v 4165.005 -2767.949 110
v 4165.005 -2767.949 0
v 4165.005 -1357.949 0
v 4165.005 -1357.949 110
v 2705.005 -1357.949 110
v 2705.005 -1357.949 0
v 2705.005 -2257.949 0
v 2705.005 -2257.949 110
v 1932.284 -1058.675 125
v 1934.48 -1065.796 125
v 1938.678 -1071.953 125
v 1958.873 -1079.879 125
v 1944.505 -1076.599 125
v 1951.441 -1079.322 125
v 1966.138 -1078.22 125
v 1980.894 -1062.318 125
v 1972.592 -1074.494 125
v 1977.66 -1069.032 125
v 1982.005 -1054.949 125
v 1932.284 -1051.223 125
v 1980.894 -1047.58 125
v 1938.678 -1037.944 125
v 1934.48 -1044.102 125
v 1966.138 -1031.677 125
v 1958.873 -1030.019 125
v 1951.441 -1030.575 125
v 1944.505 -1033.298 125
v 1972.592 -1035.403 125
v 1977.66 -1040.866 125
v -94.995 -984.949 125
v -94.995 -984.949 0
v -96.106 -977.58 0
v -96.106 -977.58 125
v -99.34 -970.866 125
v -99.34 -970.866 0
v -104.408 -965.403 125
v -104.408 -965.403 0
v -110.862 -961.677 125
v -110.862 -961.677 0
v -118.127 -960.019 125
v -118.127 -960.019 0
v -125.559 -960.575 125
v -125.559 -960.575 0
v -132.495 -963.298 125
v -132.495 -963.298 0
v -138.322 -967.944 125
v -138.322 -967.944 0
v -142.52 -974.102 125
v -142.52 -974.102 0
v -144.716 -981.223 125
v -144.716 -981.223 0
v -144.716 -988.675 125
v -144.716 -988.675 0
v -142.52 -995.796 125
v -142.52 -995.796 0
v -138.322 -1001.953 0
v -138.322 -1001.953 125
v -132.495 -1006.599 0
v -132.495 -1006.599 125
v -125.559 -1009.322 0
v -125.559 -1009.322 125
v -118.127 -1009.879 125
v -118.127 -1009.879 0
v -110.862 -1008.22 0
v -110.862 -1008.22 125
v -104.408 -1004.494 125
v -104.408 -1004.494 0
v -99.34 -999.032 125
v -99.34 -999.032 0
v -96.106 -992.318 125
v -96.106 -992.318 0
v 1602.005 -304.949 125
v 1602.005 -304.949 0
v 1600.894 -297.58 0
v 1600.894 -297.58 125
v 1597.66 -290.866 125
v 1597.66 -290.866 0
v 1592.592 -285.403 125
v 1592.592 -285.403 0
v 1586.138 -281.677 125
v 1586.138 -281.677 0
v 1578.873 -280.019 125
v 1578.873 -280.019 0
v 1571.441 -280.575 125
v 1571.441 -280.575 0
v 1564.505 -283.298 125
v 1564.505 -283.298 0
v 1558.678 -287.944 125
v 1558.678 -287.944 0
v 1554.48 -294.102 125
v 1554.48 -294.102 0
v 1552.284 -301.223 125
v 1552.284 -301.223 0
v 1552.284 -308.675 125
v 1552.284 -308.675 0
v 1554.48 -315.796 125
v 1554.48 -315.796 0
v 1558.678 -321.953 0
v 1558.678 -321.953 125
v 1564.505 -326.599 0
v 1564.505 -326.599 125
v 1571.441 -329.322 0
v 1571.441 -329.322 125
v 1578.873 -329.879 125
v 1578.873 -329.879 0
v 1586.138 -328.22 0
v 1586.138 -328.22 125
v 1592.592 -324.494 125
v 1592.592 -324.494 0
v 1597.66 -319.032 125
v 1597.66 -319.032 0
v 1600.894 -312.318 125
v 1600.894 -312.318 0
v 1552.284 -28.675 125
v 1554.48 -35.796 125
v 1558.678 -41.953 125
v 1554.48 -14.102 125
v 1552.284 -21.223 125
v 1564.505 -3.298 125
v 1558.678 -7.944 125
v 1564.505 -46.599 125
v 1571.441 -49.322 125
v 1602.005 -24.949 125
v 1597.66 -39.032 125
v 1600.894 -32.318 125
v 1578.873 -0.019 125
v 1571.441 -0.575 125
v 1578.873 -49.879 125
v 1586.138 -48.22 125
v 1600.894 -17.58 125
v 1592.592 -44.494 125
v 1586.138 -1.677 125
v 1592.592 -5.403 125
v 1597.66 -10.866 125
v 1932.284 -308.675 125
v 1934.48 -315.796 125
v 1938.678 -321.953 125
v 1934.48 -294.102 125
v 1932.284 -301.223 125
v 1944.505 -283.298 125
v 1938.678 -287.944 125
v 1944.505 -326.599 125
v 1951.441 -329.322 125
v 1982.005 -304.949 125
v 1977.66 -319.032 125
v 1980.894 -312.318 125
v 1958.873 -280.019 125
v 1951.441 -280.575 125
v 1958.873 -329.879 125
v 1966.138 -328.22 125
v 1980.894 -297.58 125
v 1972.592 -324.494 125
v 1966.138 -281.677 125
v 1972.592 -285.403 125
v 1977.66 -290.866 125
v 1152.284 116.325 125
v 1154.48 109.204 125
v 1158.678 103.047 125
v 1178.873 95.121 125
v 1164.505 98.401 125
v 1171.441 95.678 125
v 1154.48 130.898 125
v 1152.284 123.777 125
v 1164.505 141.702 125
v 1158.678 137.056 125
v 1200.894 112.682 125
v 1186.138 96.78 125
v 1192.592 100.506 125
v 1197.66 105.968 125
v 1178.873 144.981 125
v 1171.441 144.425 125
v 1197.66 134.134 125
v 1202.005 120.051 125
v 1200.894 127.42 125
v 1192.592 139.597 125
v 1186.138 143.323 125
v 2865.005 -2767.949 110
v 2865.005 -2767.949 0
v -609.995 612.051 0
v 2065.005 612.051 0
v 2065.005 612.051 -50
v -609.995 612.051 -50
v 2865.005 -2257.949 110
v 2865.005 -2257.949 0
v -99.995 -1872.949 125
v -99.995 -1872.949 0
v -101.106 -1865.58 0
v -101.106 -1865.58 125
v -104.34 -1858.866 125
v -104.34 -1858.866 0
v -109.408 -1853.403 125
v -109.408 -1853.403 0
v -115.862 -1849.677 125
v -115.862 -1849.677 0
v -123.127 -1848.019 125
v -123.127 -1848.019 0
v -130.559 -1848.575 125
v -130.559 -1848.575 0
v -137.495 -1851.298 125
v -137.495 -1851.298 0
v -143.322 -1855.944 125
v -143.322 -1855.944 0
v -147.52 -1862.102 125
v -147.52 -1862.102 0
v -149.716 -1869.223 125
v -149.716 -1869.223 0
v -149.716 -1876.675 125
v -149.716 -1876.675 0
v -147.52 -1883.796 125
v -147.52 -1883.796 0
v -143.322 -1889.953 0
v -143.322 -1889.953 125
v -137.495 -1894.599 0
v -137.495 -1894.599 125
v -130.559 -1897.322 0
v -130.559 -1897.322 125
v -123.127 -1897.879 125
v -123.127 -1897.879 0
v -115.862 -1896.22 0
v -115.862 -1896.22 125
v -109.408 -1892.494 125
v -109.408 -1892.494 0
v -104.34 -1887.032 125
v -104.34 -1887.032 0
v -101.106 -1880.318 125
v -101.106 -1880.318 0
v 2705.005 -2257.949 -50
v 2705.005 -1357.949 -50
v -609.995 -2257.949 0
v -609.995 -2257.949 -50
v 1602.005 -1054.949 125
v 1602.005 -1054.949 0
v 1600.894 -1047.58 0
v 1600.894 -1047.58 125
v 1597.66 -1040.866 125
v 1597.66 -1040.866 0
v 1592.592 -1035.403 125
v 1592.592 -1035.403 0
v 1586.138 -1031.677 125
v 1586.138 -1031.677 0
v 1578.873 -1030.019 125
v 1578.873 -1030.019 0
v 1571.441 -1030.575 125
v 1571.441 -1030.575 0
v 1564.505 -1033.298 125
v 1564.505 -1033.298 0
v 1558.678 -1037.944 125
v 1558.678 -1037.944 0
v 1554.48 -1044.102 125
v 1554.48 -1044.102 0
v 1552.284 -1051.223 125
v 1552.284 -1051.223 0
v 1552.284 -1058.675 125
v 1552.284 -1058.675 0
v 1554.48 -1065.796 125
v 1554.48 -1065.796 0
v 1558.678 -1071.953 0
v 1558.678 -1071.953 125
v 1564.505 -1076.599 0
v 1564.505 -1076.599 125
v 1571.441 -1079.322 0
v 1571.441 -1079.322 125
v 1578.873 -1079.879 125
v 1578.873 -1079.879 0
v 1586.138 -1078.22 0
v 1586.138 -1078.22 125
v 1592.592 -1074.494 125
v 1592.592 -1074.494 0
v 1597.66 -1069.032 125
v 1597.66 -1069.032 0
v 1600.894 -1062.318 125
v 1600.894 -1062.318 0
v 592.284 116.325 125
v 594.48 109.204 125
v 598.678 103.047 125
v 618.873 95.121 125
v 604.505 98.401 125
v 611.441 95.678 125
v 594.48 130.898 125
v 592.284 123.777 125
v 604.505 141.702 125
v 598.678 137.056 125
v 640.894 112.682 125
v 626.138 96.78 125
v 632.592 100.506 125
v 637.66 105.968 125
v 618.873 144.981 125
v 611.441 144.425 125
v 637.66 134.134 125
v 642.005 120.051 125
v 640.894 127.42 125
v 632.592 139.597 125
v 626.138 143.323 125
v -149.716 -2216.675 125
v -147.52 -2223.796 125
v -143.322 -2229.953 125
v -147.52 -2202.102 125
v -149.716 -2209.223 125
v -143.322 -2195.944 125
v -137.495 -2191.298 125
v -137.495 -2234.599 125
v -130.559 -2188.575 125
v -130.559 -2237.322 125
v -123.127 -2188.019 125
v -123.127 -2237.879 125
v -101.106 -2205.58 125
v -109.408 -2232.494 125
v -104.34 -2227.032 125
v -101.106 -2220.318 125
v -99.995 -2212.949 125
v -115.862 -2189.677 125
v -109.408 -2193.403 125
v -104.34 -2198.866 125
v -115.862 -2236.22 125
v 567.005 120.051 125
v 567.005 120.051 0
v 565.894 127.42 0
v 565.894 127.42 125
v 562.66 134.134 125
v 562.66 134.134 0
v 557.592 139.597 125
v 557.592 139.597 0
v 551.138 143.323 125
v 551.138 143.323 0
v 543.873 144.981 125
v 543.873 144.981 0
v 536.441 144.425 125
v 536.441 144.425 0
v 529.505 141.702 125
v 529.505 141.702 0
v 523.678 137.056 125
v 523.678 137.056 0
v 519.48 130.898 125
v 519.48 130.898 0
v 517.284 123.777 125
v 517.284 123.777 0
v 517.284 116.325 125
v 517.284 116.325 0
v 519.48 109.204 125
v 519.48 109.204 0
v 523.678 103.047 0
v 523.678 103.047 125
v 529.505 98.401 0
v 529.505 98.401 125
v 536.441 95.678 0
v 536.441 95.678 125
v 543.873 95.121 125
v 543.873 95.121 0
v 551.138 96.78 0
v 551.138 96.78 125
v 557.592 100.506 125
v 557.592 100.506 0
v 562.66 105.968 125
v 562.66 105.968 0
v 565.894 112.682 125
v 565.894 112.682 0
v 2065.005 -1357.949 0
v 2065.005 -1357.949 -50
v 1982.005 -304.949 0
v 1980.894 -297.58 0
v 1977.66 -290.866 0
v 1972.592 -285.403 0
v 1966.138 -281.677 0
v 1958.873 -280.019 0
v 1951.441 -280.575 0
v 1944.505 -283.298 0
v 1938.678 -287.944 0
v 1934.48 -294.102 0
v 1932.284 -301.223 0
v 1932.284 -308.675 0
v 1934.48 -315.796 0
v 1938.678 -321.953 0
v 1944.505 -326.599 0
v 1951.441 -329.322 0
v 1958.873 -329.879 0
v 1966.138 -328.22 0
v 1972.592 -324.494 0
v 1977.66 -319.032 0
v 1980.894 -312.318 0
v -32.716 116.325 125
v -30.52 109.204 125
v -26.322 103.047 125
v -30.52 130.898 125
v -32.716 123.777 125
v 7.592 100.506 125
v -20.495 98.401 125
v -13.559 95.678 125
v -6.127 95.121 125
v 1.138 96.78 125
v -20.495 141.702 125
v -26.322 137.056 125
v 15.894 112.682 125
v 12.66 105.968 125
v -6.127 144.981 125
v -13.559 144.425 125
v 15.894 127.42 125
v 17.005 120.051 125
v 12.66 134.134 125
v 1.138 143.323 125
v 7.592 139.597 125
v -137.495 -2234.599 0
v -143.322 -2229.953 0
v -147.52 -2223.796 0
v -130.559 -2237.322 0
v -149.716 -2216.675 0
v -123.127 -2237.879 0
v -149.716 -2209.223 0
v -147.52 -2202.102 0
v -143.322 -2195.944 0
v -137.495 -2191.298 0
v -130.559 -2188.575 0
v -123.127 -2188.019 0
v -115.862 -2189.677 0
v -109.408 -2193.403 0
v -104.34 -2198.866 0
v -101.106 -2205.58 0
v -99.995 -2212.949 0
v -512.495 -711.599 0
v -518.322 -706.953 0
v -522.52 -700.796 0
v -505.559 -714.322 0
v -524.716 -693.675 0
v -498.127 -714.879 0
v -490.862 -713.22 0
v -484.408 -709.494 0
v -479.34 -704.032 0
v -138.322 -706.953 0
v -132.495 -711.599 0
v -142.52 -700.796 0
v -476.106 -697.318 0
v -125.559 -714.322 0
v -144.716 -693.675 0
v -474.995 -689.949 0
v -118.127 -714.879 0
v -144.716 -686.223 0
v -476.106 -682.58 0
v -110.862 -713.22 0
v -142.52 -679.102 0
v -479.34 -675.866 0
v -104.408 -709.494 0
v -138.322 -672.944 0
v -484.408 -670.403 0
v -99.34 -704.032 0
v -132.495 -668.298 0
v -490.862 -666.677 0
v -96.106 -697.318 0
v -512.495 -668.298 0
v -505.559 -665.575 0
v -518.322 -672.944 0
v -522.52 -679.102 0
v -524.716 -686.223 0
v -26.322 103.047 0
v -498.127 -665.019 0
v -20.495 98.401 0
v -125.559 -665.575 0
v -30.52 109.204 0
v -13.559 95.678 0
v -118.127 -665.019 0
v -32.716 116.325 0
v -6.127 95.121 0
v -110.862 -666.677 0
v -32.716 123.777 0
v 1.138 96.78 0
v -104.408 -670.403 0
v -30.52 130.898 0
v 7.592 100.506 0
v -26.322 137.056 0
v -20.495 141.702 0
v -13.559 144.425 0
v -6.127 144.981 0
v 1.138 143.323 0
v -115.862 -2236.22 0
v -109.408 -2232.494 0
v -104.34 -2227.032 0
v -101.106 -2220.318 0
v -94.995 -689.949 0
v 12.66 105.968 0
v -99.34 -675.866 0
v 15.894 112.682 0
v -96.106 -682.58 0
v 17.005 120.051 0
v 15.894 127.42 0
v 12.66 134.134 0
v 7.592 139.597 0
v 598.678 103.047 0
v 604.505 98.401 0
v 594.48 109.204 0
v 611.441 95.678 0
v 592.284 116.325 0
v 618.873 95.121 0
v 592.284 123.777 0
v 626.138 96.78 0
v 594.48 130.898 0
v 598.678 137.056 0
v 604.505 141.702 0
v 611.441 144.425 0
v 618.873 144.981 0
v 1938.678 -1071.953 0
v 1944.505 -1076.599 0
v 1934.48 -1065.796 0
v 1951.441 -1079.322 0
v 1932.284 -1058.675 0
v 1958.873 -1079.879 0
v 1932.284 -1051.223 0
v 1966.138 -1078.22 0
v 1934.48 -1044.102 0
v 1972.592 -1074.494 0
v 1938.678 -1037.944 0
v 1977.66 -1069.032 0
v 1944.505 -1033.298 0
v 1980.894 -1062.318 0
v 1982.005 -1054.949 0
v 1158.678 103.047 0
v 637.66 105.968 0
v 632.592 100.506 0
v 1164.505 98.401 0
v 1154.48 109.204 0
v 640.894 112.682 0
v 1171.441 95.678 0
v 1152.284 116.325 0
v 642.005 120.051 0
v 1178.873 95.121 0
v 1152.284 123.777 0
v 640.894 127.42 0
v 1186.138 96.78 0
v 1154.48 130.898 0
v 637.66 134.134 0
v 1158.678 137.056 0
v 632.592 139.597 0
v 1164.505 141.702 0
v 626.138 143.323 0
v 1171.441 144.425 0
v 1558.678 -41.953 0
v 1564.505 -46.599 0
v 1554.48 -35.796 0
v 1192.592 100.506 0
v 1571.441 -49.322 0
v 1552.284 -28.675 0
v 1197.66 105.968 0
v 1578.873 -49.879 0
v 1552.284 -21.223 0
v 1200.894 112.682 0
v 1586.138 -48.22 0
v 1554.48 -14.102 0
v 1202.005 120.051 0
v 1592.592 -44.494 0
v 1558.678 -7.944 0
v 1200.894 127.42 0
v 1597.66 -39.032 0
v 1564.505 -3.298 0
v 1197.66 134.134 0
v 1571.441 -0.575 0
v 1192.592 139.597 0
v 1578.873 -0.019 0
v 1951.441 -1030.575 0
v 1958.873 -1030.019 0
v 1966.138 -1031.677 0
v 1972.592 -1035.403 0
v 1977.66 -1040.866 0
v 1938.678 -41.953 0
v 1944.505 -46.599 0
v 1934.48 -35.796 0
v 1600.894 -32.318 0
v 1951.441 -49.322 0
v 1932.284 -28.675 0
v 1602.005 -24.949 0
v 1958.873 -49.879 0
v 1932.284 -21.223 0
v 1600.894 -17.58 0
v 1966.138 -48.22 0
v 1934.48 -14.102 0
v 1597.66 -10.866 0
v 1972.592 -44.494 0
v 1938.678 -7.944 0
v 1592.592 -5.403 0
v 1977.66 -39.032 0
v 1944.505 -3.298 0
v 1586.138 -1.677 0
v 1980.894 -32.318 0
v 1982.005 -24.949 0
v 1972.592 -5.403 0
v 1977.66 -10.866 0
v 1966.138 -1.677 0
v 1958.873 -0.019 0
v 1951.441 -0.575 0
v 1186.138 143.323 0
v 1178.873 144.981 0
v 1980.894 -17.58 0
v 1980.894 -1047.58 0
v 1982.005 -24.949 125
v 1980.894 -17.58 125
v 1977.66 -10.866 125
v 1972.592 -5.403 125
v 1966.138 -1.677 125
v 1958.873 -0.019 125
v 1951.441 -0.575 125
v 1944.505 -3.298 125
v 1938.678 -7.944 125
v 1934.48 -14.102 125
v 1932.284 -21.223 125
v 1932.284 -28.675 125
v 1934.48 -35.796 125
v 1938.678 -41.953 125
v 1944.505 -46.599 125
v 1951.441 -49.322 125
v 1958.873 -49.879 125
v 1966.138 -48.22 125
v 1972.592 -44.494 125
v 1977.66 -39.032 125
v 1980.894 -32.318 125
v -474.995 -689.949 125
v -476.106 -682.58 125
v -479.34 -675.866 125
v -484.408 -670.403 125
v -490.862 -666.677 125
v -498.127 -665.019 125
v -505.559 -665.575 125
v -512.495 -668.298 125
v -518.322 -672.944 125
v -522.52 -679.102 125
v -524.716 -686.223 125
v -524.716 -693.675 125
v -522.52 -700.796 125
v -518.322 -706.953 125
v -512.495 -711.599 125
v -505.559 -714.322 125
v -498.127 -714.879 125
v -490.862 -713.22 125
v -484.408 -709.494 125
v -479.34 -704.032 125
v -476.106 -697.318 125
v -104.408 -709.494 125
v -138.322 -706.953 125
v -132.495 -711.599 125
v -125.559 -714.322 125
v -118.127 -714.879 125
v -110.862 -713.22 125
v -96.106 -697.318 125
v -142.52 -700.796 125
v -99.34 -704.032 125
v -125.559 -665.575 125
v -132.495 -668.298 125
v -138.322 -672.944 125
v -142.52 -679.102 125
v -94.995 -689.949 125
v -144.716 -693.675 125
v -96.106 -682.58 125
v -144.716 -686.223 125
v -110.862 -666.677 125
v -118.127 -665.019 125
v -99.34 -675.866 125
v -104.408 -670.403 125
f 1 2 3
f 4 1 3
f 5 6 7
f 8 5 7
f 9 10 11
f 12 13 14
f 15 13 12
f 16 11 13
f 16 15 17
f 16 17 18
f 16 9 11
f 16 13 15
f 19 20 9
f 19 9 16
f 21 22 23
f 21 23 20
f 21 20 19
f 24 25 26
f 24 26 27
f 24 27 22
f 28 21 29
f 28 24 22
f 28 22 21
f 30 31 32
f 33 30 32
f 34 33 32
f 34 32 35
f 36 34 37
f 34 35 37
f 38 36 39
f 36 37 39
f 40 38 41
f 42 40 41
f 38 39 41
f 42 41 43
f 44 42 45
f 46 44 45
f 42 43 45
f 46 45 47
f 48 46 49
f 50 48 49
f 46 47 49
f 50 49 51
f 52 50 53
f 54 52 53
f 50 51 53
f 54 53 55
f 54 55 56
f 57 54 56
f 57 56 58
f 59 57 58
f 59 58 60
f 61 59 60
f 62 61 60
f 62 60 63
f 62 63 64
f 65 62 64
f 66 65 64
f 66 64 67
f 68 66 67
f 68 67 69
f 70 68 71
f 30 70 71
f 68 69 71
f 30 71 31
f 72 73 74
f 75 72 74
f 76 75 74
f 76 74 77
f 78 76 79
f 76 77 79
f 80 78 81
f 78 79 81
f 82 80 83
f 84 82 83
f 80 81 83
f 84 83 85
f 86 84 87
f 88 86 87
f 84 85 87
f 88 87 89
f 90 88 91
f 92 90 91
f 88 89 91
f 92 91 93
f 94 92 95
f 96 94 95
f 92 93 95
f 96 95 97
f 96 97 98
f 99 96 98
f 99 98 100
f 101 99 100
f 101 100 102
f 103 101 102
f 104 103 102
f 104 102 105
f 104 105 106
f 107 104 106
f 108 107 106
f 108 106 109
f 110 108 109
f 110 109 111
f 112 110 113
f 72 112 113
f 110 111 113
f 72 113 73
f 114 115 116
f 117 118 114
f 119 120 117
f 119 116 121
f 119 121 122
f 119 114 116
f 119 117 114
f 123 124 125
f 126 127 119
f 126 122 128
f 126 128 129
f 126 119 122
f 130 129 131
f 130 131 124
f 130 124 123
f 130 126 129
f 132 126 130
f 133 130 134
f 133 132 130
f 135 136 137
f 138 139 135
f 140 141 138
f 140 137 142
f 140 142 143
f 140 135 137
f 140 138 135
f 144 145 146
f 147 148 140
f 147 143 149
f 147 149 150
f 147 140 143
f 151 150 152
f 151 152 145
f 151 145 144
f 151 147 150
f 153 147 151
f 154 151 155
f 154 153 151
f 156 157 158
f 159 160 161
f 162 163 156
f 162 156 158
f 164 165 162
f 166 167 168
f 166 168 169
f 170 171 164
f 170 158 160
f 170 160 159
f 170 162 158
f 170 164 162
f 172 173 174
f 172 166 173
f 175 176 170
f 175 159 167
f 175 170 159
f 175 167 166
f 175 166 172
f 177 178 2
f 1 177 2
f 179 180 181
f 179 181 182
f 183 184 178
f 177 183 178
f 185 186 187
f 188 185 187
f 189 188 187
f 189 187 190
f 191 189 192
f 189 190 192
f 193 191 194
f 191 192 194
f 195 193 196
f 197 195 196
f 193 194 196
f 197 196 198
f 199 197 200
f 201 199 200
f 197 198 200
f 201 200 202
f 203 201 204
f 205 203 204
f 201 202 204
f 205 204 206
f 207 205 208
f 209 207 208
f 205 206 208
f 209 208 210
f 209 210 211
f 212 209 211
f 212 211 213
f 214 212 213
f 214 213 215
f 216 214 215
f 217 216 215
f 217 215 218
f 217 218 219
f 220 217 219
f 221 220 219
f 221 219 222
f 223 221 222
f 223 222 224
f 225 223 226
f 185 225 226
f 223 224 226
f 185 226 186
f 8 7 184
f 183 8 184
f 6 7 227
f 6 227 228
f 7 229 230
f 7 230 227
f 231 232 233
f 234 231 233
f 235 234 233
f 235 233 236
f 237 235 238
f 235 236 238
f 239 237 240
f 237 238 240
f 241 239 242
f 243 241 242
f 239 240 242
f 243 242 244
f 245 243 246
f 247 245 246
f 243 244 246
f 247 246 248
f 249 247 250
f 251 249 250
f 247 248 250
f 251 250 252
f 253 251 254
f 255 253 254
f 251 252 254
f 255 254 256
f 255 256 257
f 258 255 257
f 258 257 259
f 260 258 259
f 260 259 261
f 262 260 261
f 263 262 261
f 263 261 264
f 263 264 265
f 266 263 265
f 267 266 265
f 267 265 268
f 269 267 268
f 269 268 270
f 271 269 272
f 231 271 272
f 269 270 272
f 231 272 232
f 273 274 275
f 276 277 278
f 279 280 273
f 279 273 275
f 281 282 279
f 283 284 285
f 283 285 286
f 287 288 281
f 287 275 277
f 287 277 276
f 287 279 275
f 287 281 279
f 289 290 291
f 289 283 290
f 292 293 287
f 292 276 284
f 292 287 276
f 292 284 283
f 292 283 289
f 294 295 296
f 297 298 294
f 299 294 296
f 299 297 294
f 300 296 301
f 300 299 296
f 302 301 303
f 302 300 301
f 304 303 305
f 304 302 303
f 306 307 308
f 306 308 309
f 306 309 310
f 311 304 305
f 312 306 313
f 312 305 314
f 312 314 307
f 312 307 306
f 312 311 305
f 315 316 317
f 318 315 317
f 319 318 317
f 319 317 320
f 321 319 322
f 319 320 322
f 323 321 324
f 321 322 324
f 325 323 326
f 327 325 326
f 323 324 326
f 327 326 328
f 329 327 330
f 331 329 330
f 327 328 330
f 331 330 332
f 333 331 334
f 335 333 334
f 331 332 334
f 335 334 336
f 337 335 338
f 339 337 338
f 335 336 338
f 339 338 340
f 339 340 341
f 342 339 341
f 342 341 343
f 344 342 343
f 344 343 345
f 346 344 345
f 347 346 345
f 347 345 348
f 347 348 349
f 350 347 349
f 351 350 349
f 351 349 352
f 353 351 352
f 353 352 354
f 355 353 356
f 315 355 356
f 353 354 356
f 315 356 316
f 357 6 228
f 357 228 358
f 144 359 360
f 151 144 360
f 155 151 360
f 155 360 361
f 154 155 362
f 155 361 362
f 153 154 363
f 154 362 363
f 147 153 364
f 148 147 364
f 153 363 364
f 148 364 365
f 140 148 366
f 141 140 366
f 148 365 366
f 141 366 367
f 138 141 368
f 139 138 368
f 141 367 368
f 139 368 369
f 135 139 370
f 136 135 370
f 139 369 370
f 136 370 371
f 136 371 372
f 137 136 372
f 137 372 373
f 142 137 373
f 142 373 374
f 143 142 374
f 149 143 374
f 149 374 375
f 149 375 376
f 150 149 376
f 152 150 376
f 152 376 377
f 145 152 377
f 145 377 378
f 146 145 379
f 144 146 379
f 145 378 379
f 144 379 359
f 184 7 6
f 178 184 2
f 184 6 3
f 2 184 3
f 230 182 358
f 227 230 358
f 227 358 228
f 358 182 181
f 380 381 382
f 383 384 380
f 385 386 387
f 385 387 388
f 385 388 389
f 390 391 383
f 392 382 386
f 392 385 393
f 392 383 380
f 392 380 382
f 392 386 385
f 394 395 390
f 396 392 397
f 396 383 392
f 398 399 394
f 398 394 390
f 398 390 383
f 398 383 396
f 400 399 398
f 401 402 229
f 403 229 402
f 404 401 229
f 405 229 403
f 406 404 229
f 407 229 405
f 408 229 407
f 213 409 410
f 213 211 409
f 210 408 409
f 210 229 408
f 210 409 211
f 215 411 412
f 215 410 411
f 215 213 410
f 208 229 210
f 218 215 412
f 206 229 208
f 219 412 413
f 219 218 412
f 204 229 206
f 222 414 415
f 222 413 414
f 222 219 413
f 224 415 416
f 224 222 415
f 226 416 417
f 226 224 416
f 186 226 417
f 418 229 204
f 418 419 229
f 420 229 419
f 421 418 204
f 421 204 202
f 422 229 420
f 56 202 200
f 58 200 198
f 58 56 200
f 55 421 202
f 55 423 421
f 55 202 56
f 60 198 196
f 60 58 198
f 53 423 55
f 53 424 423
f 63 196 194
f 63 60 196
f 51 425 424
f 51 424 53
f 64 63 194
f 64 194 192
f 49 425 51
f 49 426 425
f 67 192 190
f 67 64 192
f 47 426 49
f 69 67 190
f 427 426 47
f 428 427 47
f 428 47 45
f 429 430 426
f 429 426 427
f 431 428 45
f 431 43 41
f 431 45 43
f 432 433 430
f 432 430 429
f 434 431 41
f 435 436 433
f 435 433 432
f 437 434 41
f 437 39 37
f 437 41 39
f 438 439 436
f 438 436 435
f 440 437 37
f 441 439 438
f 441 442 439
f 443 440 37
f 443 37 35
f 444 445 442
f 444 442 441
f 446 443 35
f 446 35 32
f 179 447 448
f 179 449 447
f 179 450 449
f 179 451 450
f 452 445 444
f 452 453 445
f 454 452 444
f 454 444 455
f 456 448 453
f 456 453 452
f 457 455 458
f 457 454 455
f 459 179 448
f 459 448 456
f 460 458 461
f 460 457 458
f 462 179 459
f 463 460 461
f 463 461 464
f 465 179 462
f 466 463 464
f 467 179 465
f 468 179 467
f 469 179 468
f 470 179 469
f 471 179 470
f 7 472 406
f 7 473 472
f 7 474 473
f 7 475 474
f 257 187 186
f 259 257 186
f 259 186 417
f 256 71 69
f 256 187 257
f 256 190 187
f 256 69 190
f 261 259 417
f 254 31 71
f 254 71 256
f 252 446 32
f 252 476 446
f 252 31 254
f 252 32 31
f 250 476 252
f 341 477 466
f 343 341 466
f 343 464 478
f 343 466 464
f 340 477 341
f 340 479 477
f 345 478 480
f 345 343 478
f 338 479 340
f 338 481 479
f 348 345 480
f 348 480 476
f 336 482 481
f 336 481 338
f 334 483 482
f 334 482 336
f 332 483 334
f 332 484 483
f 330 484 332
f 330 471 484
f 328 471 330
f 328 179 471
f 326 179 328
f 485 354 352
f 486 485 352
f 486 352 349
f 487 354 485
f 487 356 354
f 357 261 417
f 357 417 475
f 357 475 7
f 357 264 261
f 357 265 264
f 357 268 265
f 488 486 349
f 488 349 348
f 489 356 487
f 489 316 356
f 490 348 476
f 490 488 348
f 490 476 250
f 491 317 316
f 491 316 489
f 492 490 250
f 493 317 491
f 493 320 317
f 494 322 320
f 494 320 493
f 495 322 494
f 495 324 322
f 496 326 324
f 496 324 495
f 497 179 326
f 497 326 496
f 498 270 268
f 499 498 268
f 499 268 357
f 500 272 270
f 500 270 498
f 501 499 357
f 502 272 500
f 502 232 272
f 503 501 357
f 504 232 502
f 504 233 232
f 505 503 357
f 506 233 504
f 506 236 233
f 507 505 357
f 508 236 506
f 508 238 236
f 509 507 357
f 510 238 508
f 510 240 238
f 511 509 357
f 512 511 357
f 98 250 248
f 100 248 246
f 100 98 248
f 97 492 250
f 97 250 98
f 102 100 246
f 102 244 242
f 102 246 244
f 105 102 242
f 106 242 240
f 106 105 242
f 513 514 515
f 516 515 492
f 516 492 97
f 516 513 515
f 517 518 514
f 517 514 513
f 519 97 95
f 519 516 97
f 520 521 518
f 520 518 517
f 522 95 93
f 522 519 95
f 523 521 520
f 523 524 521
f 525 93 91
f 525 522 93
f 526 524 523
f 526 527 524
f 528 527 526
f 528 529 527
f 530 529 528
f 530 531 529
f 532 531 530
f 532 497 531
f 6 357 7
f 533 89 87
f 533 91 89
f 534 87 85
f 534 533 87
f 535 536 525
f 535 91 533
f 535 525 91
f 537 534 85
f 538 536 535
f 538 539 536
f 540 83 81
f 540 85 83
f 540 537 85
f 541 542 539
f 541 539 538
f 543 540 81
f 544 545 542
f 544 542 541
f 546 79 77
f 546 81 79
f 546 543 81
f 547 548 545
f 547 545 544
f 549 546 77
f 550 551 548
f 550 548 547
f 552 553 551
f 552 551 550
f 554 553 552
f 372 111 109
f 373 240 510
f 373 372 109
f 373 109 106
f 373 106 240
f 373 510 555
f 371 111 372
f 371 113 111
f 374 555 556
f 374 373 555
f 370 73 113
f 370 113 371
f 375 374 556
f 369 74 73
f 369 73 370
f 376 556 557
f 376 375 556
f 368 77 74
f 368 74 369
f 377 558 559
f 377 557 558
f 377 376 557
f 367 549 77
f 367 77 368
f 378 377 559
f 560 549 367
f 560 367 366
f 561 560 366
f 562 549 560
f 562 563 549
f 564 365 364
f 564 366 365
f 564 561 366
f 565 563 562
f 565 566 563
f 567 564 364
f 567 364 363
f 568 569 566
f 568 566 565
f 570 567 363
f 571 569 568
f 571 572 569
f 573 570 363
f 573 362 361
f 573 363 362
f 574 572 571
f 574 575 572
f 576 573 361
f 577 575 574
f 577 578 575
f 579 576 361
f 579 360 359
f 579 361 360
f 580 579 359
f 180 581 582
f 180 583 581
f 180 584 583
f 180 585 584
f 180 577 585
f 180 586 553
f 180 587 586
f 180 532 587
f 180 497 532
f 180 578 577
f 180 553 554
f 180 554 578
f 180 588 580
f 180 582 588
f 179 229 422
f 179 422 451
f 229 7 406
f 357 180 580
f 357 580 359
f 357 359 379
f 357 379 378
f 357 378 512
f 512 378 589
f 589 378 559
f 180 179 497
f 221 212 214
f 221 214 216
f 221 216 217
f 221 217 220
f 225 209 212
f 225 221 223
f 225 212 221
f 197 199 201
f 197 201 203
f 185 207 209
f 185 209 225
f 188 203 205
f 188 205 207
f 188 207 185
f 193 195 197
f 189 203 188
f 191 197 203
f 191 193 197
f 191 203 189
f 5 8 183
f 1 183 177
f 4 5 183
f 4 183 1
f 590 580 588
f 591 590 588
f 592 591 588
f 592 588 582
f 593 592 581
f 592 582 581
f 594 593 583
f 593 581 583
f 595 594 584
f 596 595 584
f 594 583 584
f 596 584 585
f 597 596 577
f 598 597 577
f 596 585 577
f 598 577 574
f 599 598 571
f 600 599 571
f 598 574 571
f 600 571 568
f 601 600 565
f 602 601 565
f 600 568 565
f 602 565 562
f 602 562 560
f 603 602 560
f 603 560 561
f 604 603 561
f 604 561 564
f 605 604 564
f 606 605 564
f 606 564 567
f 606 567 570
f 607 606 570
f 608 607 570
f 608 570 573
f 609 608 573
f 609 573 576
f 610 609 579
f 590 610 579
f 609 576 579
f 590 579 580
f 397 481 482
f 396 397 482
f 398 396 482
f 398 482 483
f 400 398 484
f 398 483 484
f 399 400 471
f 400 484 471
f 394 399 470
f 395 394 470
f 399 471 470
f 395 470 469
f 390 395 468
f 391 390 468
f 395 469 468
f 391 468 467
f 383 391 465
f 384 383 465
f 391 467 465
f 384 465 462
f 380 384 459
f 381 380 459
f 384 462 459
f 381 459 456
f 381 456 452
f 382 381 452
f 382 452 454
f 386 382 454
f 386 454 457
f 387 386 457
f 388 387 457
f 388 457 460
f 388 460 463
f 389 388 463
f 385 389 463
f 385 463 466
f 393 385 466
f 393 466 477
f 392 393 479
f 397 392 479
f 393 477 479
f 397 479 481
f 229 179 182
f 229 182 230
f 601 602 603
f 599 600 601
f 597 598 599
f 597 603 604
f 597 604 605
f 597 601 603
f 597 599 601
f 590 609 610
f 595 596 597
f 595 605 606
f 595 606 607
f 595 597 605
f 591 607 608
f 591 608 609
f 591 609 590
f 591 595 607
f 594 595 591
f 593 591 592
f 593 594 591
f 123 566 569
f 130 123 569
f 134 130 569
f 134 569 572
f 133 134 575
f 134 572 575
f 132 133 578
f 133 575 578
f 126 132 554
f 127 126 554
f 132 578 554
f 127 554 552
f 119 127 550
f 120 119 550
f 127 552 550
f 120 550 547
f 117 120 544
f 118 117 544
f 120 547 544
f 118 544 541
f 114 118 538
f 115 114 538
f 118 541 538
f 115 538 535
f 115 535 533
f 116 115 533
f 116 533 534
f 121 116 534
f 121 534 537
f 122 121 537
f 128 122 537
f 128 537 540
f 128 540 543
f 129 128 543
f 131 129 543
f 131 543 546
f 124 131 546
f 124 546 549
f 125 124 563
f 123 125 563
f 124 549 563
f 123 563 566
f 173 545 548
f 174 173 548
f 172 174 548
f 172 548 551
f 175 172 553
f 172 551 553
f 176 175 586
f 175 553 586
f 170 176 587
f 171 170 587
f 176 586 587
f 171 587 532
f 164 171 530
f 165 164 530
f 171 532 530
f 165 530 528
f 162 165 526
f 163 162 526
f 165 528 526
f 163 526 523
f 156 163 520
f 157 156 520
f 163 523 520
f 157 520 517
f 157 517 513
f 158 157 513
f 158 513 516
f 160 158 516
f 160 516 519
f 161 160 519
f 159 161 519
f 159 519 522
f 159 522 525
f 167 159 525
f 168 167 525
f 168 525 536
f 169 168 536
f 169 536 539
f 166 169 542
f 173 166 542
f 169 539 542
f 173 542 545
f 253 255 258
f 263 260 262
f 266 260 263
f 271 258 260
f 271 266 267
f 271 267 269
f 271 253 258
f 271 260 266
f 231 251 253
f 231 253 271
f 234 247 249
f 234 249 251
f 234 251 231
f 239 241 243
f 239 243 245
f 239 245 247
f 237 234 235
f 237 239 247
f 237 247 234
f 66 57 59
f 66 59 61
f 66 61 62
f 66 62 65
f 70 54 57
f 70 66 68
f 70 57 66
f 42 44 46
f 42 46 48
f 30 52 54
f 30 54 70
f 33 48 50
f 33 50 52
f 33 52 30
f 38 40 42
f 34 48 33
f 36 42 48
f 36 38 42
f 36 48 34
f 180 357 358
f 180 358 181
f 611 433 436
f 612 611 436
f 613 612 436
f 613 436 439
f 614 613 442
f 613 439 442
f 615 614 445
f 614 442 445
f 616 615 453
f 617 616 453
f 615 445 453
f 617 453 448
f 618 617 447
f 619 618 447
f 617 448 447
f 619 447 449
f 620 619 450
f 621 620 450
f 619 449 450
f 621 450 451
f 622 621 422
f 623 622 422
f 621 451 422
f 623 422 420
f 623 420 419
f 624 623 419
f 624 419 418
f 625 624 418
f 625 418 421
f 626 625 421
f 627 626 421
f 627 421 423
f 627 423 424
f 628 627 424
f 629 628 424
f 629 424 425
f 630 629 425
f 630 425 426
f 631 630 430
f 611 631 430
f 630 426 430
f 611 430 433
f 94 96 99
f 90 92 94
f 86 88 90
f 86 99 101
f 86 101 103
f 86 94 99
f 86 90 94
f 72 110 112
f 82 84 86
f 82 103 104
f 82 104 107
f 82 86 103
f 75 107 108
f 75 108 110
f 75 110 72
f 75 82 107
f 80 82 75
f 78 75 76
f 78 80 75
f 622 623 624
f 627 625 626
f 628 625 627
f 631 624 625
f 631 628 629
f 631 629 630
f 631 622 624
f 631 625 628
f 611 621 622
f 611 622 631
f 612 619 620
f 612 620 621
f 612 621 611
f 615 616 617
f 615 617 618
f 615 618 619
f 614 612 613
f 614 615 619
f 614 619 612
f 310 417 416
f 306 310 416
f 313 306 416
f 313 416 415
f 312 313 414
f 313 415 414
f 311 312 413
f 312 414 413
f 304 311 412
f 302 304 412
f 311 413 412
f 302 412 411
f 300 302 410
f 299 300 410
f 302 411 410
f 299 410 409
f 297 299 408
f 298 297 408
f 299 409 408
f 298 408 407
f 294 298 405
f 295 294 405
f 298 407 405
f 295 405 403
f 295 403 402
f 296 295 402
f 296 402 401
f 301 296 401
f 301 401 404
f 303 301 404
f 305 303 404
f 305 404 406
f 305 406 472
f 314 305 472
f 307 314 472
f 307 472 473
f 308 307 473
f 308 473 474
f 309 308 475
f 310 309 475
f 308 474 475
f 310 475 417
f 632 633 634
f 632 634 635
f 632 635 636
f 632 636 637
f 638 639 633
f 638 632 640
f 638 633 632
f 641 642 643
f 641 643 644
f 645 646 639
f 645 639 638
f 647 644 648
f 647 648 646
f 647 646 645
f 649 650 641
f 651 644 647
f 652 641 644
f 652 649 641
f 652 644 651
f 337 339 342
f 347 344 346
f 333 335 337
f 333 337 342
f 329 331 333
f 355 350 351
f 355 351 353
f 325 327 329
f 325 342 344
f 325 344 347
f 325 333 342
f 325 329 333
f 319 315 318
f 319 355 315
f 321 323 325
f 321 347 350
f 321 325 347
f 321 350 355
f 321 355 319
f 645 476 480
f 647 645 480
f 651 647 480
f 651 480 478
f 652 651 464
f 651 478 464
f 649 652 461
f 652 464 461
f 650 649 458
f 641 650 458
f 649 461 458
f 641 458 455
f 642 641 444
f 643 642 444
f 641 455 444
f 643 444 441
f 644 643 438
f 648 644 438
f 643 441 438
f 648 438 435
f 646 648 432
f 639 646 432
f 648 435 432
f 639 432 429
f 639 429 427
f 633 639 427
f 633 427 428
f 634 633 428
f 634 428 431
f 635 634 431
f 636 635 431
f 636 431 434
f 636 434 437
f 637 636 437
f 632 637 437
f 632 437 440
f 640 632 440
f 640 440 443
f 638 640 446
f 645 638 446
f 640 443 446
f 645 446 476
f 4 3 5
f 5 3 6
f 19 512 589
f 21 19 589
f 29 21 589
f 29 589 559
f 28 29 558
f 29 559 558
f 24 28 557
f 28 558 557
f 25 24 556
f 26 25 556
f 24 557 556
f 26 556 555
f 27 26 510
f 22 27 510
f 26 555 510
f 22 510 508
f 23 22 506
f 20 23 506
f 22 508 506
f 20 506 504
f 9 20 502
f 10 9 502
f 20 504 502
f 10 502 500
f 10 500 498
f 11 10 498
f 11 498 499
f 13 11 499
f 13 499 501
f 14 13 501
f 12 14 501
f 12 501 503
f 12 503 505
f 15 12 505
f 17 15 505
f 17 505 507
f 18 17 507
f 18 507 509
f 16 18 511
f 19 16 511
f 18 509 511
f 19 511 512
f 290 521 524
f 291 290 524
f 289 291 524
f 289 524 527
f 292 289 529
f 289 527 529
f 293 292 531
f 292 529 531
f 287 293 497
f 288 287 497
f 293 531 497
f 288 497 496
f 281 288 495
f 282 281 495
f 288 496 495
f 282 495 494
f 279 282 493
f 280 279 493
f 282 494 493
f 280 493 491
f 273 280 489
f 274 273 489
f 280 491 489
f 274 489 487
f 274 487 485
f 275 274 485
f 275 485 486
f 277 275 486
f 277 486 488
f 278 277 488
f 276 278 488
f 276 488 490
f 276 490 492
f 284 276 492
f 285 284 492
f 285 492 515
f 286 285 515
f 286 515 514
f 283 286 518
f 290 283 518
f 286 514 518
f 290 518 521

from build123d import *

# Parameters (mm, degrees)
F1_DEPTH = 50
F3_DEPTH = 110
F4_R     = 25
F5_DEPTH = 125


with BuildPart() as f1:
    # F0 (on Top) → F1 (new body)
    with BuildSketch(Plane.XY):
        Polygon((-609.995488, 612.05135), (-609.995488, -2257.94865), (2065.004512, -2257.94865), (2705.004512, -2257.94865), (2705.004512, -1357.94865), (2065.004512, -1357.94865), (2065.004512, 612.05135), align=None)
    extrude(amount=-F1_DEPTH)

    # F4 (on face) → F5 (join)
    with BuildSketch(Plane.XY):
        with Locations((-7.995488, 120.05135)):
            Circle(F4_R)
        with Locations((-119.995488, -689.94865)):
            Circle(F4_R)
        with Locations((-499.995488, -689.94865)):
            Circle(F4_R)
        with Locations((-119.995488, -984.94865)):
            Circle(F4_R)
        with Locations((617.004512, 120.05135)):
            Circle(F4_R)
        with Locations((542.004512, 120.05135)):
            Circle(F4_R)
        with Locations((1177.004512, 120.05135)):
            Circle(F4_R)
        with Locations((1577.004512, -24.94865)):
            Circle(F4_R)
        with Locations((1577.004512, -304.94865)):
            Circle(F4_R)
        with Locations((-124.995488, -1872.94865)):
            Circle(F4_R)
        with Locations((-124.995488, -2212.94865)):
            Circle(F4_R)
        with Locations((1957.004512, -304.94865)):
            Circle(F4_R)
        with Locations((1957.004512, -24.94865)):
            Circle(F4_R)
        with Locations((1957.004512, -1054.94865)):
            Circle(F4_R)
        with Locations((1577.004512, -1054.94865)):
            Circle(F4_R)
    extrude(amount=F5_DEPTH)


with BuildPart() as f3:
    # F2 (on face) → F3 (new body)
    with BuildSketch(Plane.XY):
        Polygon((2705.004512, -1357.94865), (2705.004512, -2257.94865), (2865.004512, -2257.94865), (2865.004512, -2767.94865), (4165.004512, -2767.94865), (4165.004512, -1357.94865), align=None)
    extrude(amount=F3_DEPTH)


solid = Compound([f1.part, f3.part])
